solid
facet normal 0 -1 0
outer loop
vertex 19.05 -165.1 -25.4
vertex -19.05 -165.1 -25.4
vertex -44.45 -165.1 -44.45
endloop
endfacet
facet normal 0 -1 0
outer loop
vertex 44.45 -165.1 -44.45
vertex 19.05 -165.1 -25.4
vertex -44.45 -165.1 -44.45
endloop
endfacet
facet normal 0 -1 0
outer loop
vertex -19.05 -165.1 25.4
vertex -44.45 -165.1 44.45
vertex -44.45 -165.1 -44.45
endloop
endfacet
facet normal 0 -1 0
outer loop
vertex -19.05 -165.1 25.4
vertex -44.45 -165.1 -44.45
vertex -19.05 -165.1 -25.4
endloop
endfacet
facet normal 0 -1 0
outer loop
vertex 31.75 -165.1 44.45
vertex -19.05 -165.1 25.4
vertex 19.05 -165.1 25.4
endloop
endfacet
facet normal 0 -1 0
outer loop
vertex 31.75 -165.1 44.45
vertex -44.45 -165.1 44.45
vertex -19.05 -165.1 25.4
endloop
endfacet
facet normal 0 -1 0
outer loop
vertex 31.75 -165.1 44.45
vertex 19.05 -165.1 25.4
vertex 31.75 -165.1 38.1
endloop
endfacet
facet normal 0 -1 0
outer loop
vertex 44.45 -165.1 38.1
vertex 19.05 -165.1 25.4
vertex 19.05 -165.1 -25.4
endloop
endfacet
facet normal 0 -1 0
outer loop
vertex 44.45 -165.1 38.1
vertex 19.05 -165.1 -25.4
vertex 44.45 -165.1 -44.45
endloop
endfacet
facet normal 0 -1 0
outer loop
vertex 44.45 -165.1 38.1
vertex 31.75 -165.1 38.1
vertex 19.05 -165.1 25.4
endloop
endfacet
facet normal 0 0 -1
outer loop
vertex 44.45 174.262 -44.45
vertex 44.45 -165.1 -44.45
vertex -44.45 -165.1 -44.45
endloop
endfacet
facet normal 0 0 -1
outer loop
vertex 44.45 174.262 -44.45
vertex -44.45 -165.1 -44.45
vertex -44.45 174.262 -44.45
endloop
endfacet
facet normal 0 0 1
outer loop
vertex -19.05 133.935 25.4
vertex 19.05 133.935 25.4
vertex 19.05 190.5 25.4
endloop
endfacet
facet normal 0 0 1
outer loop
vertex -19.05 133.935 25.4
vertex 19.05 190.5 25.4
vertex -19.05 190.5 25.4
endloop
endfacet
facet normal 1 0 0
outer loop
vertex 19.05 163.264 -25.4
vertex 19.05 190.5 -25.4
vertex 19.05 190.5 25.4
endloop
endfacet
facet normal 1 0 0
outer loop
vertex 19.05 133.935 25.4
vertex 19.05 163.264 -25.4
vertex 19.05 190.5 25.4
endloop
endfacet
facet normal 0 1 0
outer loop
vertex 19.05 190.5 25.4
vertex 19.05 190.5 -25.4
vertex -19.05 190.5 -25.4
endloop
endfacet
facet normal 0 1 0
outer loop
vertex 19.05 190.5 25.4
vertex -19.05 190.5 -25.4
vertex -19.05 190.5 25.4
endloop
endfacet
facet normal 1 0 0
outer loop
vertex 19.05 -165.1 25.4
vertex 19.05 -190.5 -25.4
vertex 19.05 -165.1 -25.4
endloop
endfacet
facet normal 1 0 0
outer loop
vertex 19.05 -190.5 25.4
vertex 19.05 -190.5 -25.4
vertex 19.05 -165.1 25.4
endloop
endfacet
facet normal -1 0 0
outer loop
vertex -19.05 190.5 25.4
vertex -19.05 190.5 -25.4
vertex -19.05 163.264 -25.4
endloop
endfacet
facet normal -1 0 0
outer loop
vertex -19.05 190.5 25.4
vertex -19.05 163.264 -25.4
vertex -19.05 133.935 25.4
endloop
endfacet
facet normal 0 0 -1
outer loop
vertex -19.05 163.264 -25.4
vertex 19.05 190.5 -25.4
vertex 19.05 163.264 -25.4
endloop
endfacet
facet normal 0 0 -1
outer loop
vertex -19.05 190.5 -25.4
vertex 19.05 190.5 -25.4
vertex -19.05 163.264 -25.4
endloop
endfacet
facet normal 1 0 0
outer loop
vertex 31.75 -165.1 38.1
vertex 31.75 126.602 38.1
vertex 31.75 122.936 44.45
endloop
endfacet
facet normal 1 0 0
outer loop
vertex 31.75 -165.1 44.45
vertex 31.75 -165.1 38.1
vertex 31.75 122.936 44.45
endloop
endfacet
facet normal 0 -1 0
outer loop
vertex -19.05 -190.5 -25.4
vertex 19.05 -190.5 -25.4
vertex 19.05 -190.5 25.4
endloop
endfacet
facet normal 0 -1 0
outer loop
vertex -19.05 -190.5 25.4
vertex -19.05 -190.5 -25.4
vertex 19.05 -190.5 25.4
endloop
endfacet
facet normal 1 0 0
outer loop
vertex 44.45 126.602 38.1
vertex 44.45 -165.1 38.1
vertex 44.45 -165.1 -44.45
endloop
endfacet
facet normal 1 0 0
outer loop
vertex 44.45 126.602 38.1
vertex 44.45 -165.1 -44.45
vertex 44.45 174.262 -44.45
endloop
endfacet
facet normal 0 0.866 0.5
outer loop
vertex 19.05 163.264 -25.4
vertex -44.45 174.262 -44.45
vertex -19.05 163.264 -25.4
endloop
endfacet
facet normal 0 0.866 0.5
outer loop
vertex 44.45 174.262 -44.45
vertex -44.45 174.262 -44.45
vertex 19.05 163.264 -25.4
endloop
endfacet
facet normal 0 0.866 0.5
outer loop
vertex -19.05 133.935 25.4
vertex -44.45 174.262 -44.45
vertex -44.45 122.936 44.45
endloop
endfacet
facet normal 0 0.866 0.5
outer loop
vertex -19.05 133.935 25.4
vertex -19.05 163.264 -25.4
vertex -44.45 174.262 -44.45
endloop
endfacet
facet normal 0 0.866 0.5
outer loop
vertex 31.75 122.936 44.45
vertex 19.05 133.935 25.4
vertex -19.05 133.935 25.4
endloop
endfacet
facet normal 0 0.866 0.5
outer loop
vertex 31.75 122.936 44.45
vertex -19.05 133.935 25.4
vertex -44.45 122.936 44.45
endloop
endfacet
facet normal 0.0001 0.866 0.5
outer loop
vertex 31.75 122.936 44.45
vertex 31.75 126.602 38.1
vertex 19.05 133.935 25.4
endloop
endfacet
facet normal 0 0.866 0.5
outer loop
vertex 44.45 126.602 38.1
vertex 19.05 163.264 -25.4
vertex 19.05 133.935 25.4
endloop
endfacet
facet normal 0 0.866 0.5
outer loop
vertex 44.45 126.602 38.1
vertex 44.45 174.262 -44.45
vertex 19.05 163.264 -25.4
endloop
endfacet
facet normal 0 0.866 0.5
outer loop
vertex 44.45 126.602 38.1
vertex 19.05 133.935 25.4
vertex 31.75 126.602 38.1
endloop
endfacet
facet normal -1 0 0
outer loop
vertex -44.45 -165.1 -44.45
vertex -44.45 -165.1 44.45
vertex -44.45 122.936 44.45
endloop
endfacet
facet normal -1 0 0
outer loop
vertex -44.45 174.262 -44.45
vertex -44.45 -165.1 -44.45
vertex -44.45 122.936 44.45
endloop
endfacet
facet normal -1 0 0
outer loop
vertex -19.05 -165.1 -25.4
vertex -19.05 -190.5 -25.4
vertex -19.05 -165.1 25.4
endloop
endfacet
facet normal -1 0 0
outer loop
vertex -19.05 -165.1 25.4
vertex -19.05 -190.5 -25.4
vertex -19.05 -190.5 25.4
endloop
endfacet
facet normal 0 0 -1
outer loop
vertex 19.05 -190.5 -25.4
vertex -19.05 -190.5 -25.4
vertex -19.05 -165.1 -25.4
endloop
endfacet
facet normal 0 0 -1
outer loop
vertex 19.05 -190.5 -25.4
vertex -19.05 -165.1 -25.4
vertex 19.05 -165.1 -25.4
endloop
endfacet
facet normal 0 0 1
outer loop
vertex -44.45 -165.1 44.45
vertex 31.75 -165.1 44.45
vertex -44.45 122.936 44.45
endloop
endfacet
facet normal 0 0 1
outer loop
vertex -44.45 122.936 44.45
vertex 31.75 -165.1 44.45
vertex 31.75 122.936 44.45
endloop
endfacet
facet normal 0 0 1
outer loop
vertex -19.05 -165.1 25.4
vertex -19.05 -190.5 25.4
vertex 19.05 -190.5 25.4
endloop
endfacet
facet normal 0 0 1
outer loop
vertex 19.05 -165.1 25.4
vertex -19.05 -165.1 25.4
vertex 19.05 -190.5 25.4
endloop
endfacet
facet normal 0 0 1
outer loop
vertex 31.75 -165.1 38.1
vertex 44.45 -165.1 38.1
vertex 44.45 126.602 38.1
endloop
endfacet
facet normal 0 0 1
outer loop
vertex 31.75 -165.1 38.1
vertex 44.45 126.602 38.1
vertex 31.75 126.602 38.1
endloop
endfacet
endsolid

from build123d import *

# Parameters (mm, degrees)
F0_W     = 381
F0_H     = 88.9
F1_DEPTH = 44.45
F4_W     = 12.7
F4_H     = 6.35
F5_DEPTH = 381.001
F6_W     = 88.9
F6_H     = 88.9
F6_W_2   = 38.1
F6_H_2   = 50.8
F7_REACH = 193.287585695
F8_W     = 88.9
F8_H     = 88.9
F8_W_2   = 38.1
F8_H_2   = 50.8
F9_DEPTH = 25.4


with BuildPart() as f1:
    # F0 (on Right) → F1 (new body, symmetric)
    with BuildSketch(Plane.YZ):
        Rectangle(F0_W, F0_H)
    extrude(amount=F1_DEPTH, both=True)

    # F4 (on face) → F5 (cut, through all)
    with BuildSketch(Plane(origin=(0, 190.5, 0), x_dir=(-1, 0, 0), z_dir=(0, 1, 0))):
        with Locations((-38.1, 41.275)):
            Rectangle(F4_W, F4_H)
    extrude(amount=-F5_DEPTH, mode=Mode.SUBTRACT)

    f7_end = Plane(origin=(0, 111.4494145991, 64.3453495198), x_dir=(0, -0.5, 0.8660254038), z_dir=(0, 0.8660254038, 0.5))
    # F6 (on face) → F7 (cut, up to a plane its end follows)
    with BuildSketch(Plane(origin=(0, 190.5, 0), x_dir=(-1, 0, 0), z_dir=(0, 1, 0))):
        Rectangle(F6_W, F6_H)
        Rectangle(F6_W_2, F6_H_2, mode=Mode.SUBTRACT)
    f7_long = extrude(amount=-F7_REACH, mode=Mode.PRIVATE)
    add(split(f7_long, bisect_by=f7_end, keep=Keep.TOP, mode=Mode.PRIVATE), mode=Mode.SUBTRACT)

    # F8 (on face) → F9 (cut)
    with BuildSketch(Plane.XZ.offset(190.5)):
        Rectangle(F8_W, F8_H)
        Rectangle(F8_W_2, F8_H_2, mode=Mode.SUBTRACT)
    extrude(amount=-F9_DEPTH, mode=Mode.SUBTRACT)


solid = f1.part
